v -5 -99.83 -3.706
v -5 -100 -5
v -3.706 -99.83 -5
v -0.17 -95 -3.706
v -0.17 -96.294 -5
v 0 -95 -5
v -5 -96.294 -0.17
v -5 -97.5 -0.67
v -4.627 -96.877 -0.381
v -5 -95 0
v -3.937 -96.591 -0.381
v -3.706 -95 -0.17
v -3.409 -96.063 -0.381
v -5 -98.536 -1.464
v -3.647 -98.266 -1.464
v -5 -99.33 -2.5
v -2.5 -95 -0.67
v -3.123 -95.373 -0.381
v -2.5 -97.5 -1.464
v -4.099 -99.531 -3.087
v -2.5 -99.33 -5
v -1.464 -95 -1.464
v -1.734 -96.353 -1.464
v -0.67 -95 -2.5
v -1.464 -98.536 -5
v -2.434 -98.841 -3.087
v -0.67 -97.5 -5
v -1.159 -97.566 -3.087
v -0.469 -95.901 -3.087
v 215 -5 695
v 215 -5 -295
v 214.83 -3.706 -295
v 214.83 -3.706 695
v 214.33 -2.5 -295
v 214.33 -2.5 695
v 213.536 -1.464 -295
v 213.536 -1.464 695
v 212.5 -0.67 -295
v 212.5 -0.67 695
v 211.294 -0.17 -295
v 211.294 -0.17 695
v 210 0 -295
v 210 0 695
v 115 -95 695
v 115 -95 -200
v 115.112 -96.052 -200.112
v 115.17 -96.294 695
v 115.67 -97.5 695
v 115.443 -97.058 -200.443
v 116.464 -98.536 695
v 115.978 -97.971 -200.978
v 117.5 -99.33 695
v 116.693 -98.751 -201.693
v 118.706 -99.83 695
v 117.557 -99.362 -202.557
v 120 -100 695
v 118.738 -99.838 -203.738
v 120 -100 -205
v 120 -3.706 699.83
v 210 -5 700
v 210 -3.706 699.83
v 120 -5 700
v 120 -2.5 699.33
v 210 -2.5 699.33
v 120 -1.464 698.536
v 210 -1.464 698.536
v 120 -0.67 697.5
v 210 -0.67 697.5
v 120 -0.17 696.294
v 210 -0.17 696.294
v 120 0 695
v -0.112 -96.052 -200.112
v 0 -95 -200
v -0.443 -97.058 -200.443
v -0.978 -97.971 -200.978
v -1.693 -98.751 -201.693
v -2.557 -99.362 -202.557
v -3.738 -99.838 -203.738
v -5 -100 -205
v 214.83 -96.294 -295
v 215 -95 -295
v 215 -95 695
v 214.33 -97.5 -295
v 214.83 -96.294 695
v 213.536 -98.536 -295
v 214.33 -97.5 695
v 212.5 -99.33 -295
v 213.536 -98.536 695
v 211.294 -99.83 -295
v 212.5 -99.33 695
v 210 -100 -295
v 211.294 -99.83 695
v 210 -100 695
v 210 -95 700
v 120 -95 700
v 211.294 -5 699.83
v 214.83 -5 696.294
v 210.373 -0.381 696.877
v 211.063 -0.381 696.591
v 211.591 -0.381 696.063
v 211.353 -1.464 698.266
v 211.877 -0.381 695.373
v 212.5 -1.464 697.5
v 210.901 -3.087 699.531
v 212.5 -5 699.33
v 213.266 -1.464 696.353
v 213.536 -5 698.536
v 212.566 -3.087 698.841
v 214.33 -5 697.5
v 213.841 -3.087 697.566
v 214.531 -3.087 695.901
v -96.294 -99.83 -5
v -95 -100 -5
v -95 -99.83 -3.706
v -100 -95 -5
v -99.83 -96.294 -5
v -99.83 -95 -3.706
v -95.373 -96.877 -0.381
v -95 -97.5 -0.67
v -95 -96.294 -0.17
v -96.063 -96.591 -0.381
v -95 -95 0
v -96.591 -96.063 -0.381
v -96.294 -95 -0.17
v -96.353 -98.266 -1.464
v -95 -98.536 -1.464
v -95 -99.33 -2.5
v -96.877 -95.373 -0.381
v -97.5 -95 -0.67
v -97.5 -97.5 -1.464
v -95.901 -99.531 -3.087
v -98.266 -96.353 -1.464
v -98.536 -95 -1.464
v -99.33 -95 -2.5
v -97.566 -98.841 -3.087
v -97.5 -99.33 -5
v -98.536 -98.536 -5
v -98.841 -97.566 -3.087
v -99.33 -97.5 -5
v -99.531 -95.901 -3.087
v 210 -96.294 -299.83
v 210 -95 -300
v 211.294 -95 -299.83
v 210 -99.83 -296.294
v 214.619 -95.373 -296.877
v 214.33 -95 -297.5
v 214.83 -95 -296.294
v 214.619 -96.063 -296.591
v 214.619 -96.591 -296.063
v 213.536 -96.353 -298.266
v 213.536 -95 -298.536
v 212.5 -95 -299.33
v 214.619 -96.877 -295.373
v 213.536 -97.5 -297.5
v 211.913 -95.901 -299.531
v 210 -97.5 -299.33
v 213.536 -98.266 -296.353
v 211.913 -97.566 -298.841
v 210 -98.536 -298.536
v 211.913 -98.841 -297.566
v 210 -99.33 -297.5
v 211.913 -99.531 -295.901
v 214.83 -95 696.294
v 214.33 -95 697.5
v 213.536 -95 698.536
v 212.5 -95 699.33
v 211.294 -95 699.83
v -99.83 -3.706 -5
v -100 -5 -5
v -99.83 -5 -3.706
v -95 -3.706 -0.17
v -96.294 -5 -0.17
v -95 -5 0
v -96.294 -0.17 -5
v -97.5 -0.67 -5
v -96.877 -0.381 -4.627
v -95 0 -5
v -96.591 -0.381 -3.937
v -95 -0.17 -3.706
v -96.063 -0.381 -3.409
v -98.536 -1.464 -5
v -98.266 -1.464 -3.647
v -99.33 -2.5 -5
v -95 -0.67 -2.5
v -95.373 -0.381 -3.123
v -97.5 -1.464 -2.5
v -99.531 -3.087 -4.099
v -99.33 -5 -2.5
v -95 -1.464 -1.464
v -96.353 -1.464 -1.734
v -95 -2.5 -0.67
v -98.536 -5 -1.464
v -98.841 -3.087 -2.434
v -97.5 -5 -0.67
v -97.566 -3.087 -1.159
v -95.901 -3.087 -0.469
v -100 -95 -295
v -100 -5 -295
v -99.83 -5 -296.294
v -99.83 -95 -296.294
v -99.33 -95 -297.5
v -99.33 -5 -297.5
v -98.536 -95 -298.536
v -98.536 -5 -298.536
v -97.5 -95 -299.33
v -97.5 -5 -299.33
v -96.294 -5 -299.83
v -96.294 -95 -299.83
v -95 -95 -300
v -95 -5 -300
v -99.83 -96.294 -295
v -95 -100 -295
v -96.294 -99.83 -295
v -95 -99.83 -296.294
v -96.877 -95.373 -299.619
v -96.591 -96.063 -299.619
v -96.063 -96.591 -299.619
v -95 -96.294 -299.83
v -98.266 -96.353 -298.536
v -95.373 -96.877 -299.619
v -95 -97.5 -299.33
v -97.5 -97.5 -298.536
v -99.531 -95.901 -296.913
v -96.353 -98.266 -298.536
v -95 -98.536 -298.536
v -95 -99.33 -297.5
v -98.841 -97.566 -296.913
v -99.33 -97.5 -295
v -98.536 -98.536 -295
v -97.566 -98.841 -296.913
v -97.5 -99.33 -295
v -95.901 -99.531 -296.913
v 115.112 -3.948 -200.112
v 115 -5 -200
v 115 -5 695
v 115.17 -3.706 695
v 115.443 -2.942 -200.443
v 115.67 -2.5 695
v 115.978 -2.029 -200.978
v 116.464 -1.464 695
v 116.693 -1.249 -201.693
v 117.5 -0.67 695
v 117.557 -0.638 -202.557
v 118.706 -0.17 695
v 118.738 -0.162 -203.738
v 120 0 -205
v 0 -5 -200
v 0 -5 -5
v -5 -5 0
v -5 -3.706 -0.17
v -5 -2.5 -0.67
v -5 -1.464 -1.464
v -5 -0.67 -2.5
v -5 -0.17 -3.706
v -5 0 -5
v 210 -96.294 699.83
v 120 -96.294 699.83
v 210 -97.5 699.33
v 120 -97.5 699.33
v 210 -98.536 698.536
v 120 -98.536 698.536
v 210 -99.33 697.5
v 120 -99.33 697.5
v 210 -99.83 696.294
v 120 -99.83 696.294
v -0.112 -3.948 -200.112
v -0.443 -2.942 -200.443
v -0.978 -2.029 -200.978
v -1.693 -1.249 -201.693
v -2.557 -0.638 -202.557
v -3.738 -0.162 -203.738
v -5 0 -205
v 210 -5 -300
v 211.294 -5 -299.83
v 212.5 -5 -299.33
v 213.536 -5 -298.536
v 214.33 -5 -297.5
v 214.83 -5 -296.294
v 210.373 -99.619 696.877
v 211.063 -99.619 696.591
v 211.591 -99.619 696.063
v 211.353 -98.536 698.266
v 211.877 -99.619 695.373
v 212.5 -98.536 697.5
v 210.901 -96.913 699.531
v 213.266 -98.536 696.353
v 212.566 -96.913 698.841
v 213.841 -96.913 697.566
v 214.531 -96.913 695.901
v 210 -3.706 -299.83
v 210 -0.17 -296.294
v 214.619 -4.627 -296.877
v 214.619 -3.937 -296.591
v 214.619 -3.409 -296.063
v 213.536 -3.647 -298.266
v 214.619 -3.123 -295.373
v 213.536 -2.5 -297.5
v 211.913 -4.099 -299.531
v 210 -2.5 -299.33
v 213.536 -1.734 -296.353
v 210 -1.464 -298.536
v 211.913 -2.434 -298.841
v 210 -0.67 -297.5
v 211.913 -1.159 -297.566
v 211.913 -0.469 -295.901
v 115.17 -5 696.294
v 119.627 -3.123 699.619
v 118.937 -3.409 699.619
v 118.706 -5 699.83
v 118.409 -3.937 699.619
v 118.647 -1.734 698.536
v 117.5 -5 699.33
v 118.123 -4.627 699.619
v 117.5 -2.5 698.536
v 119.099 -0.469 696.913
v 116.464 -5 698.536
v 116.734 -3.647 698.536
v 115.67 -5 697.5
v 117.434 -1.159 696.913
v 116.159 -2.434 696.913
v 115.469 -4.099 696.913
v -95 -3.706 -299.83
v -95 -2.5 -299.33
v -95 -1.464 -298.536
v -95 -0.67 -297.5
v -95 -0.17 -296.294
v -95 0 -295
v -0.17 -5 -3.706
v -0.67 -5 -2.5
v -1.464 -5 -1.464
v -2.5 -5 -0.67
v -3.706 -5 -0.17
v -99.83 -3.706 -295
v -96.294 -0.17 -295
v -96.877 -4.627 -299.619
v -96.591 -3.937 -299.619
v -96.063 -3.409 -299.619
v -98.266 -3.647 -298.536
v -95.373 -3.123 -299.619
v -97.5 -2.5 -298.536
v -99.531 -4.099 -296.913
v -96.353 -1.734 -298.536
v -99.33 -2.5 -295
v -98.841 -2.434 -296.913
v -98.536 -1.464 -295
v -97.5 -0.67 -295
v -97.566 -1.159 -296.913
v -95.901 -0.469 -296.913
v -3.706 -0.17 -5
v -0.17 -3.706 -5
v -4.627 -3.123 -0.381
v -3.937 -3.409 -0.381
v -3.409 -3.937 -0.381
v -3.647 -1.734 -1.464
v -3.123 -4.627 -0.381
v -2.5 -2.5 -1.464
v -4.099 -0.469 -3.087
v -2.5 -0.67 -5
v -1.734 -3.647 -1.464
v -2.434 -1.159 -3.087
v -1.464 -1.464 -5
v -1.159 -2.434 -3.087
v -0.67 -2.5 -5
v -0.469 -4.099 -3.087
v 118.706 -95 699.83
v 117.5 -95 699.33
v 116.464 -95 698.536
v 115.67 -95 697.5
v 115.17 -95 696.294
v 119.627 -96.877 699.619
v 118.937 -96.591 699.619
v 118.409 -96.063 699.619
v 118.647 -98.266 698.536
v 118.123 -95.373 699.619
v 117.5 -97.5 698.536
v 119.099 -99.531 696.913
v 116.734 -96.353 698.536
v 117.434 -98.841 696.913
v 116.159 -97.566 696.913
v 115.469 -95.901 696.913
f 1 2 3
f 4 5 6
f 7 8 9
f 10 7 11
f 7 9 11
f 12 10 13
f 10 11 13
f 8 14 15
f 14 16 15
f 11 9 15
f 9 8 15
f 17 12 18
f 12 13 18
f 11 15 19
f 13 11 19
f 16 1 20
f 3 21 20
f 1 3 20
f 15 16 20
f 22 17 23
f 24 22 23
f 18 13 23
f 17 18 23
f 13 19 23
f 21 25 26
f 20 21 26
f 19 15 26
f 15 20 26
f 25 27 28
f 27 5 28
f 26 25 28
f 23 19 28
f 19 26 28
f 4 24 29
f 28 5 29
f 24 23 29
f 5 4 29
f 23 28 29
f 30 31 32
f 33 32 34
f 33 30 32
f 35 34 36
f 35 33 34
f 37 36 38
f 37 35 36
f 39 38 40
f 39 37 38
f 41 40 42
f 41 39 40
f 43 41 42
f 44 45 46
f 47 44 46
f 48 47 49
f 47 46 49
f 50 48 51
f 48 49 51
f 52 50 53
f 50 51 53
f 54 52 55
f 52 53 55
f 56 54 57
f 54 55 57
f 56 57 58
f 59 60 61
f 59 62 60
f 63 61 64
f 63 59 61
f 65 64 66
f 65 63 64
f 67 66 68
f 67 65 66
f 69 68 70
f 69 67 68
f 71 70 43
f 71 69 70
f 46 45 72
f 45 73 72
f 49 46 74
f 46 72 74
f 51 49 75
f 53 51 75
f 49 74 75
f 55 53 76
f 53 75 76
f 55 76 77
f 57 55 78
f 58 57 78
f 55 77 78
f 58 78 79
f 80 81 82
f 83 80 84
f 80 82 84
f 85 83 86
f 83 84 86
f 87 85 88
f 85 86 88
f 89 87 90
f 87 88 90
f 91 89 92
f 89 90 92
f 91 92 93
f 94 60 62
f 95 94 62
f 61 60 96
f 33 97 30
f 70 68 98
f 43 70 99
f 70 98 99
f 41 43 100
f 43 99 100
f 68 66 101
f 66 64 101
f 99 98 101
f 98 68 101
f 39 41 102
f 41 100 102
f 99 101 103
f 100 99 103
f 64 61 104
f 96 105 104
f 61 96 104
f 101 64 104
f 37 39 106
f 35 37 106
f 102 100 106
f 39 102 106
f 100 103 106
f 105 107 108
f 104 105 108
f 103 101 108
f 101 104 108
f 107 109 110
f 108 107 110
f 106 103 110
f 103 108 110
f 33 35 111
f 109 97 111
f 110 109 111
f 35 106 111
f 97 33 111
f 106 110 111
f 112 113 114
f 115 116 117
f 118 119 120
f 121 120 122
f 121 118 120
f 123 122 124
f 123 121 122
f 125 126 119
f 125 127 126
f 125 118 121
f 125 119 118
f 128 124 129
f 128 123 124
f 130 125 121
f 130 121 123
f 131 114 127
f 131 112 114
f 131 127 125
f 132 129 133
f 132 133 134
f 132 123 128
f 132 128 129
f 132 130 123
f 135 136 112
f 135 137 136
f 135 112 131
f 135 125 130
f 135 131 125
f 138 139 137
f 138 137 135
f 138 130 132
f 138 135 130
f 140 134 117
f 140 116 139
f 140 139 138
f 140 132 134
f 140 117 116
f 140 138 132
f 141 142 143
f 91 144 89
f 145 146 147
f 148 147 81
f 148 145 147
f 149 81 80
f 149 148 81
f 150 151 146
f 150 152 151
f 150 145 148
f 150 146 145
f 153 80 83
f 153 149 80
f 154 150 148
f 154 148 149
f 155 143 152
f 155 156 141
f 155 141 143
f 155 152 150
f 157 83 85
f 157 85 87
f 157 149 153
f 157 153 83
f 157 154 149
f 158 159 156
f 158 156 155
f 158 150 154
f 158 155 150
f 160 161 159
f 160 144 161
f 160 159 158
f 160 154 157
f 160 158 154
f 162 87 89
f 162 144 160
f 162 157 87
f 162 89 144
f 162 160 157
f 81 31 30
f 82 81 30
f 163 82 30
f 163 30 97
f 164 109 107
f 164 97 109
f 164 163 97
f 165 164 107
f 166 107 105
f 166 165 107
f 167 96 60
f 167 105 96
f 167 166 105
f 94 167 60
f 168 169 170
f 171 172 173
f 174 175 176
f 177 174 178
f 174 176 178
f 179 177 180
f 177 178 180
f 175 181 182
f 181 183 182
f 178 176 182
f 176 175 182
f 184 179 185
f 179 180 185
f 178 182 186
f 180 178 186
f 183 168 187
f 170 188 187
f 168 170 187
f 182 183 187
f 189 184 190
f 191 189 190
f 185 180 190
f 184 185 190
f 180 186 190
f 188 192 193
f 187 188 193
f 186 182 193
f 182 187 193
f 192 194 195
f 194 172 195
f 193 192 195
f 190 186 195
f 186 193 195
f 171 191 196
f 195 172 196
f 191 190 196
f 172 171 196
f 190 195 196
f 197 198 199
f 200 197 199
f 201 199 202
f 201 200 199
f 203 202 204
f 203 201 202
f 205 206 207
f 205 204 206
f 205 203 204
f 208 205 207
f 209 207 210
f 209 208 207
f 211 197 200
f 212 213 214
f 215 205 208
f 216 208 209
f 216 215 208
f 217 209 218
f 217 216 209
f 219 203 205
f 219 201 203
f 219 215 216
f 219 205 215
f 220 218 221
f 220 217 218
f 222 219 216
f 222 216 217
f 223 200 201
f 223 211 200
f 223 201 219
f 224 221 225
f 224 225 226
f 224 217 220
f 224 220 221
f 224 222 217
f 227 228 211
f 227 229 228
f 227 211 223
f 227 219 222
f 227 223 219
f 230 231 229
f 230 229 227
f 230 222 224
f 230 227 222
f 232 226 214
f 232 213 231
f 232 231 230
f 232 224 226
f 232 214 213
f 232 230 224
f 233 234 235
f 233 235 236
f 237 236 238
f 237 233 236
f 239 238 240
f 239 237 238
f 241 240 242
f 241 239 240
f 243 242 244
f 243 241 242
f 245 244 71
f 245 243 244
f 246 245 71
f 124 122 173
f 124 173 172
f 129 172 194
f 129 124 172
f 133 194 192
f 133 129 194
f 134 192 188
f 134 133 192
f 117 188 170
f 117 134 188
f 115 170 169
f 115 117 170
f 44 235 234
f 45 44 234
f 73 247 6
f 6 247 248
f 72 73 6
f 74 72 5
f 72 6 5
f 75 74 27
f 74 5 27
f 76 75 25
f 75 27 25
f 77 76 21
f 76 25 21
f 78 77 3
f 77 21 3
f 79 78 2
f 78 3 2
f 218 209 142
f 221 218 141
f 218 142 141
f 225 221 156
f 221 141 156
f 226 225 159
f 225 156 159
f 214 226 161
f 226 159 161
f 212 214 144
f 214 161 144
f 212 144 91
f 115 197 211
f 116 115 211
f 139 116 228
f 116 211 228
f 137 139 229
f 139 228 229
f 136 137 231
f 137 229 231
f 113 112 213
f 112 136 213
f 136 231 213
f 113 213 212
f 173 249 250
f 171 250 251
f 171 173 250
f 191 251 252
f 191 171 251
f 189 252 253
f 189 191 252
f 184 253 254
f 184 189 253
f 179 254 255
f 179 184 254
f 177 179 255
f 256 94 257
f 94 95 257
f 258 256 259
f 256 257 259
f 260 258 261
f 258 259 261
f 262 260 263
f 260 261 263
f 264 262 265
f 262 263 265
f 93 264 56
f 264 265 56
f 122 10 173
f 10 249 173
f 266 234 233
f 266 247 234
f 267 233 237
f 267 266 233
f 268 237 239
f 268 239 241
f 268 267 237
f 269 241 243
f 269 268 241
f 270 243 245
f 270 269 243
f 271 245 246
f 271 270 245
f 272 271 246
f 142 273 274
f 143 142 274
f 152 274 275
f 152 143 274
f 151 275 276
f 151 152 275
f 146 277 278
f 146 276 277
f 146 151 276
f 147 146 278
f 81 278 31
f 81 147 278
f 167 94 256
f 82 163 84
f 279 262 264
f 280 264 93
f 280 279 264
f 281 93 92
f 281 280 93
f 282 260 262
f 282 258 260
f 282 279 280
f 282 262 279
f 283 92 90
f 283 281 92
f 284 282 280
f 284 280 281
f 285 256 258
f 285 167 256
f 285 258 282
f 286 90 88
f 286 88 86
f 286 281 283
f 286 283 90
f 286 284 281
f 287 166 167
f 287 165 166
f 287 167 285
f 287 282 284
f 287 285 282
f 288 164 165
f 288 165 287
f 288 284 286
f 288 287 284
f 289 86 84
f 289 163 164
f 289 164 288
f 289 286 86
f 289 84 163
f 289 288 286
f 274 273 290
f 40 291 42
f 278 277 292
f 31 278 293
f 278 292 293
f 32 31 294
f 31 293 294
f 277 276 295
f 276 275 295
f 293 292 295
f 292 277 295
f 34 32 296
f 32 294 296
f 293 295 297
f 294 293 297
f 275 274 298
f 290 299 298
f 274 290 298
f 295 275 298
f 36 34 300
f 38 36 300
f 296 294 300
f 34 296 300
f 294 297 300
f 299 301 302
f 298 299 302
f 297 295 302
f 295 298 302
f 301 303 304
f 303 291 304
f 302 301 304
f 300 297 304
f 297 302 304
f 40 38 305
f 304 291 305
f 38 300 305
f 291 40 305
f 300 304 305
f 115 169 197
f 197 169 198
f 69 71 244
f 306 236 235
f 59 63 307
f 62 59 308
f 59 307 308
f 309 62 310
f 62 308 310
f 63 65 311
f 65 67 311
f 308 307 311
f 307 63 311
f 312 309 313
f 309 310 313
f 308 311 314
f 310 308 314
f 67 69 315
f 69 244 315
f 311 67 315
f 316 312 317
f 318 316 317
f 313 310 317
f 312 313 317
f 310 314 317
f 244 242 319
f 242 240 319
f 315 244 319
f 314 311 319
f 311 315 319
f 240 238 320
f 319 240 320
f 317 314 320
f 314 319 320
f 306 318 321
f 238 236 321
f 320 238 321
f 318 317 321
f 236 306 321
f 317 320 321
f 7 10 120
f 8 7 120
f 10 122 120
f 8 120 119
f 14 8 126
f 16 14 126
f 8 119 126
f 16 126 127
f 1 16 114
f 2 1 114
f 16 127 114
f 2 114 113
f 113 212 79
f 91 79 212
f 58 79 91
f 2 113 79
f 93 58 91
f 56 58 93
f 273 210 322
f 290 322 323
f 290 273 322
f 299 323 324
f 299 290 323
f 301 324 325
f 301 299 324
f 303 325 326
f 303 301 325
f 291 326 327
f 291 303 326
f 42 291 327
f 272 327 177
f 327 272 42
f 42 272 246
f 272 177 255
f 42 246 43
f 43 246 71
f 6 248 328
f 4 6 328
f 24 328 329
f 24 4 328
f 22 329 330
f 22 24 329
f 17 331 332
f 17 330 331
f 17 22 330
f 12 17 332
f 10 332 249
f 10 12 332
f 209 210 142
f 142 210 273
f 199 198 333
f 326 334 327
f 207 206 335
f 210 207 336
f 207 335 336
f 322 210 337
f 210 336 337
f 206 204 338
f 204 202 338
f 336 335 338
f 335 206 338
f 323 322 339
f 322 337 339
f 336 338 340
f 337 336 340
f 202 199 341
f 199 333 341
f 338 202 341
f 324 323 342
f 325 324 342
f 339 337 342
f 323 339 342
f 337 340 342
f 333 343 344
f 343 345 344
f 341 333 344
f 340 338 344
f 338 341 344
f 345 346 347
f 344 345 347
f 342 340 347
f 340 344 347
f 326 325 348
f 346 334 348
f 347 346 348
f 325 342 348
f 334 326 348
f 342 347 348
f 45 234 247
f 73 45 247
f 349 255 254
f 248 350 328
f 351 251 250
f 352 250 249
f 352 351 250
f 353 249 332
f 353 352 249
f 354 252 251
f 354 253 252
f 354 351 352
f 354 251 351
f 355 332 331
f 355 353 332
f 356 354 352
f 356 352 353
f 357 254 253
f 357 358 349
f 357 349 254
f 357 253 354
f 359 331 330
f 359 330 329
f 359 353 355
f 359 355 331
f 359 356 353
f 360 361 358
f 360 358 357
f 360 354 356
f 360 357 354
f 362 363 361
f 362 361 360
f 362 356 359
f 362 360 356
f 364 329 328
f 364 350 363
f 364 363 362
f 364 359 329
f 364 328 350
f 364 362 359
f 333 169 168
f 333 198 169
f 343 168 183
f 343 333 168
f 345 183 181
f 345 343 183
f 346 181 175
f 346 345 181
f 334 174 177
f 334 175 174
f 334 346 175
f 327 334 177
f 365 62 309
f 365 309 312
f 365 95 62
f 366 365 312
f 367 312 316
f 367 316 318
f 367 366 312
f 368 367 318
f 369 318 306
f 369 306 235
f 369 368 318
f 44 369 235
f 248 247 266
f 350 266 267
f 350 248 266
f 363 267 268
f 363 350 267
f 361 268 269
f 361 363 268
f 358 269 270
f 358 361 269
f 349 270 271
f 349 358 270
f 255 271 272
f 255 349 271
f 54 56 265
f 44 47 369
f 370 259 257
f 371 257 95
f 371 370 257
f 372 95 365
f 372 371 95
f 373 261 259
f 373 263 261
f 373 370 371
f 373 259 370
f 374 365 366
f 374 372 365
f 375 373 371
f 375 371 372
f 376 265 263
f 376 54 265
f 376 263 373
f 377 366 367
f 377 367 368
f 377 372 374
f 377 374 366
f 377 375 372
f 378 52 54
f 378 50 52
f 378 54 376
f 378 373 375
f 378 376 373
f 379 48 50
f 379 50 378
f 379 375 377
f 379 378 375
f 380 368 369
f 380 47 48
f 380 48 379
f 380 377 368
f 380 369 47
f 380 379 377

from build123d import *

# Parameters (mm, degrees)
F1_DEPTH = 100
F2_R     = 5


with BuildPart() as f1:
    # F0 (on Front) → F1 (new body)
    with BuildSketch(Plane.XZ):
        Polygon((0, -200), (0, 0), (-100, 0), (-100, -300), (215, -300), (215, 700), (115, 700), (115, -200), align=None)
    extrude(amount=F1_DEPTH)

    # F2
    f2_edges = [f1.edges().sort_by_distance(p)[0] for p in [
        (-100, -100, -150),
        (115, -100, 250),
        (57.5, -100, -200),
        (0, -100, -100),
        (-50, -100, 0),
        (-100, -50, 0),
        (-100, 0, -150),
        (-100, -50, -300),
        (57.5, -100, -300),
        (57.5, 0, -300),
        (57.5, 0, -200),
        (0, 0, -100),
        (-50, 0, 0),
        (0, -50, 0),
        (115, 0, 250),
        (215, -50, -300),
        (215, -50, 700),
        (165, 0, 700),
        (165, -100, 700),
        (115, -50, 700),
        (215, 0, 200),
        (215, -100, 200),
    ]]
    fillet(f2_edges, radius=F2_R)


solid = f1.part
